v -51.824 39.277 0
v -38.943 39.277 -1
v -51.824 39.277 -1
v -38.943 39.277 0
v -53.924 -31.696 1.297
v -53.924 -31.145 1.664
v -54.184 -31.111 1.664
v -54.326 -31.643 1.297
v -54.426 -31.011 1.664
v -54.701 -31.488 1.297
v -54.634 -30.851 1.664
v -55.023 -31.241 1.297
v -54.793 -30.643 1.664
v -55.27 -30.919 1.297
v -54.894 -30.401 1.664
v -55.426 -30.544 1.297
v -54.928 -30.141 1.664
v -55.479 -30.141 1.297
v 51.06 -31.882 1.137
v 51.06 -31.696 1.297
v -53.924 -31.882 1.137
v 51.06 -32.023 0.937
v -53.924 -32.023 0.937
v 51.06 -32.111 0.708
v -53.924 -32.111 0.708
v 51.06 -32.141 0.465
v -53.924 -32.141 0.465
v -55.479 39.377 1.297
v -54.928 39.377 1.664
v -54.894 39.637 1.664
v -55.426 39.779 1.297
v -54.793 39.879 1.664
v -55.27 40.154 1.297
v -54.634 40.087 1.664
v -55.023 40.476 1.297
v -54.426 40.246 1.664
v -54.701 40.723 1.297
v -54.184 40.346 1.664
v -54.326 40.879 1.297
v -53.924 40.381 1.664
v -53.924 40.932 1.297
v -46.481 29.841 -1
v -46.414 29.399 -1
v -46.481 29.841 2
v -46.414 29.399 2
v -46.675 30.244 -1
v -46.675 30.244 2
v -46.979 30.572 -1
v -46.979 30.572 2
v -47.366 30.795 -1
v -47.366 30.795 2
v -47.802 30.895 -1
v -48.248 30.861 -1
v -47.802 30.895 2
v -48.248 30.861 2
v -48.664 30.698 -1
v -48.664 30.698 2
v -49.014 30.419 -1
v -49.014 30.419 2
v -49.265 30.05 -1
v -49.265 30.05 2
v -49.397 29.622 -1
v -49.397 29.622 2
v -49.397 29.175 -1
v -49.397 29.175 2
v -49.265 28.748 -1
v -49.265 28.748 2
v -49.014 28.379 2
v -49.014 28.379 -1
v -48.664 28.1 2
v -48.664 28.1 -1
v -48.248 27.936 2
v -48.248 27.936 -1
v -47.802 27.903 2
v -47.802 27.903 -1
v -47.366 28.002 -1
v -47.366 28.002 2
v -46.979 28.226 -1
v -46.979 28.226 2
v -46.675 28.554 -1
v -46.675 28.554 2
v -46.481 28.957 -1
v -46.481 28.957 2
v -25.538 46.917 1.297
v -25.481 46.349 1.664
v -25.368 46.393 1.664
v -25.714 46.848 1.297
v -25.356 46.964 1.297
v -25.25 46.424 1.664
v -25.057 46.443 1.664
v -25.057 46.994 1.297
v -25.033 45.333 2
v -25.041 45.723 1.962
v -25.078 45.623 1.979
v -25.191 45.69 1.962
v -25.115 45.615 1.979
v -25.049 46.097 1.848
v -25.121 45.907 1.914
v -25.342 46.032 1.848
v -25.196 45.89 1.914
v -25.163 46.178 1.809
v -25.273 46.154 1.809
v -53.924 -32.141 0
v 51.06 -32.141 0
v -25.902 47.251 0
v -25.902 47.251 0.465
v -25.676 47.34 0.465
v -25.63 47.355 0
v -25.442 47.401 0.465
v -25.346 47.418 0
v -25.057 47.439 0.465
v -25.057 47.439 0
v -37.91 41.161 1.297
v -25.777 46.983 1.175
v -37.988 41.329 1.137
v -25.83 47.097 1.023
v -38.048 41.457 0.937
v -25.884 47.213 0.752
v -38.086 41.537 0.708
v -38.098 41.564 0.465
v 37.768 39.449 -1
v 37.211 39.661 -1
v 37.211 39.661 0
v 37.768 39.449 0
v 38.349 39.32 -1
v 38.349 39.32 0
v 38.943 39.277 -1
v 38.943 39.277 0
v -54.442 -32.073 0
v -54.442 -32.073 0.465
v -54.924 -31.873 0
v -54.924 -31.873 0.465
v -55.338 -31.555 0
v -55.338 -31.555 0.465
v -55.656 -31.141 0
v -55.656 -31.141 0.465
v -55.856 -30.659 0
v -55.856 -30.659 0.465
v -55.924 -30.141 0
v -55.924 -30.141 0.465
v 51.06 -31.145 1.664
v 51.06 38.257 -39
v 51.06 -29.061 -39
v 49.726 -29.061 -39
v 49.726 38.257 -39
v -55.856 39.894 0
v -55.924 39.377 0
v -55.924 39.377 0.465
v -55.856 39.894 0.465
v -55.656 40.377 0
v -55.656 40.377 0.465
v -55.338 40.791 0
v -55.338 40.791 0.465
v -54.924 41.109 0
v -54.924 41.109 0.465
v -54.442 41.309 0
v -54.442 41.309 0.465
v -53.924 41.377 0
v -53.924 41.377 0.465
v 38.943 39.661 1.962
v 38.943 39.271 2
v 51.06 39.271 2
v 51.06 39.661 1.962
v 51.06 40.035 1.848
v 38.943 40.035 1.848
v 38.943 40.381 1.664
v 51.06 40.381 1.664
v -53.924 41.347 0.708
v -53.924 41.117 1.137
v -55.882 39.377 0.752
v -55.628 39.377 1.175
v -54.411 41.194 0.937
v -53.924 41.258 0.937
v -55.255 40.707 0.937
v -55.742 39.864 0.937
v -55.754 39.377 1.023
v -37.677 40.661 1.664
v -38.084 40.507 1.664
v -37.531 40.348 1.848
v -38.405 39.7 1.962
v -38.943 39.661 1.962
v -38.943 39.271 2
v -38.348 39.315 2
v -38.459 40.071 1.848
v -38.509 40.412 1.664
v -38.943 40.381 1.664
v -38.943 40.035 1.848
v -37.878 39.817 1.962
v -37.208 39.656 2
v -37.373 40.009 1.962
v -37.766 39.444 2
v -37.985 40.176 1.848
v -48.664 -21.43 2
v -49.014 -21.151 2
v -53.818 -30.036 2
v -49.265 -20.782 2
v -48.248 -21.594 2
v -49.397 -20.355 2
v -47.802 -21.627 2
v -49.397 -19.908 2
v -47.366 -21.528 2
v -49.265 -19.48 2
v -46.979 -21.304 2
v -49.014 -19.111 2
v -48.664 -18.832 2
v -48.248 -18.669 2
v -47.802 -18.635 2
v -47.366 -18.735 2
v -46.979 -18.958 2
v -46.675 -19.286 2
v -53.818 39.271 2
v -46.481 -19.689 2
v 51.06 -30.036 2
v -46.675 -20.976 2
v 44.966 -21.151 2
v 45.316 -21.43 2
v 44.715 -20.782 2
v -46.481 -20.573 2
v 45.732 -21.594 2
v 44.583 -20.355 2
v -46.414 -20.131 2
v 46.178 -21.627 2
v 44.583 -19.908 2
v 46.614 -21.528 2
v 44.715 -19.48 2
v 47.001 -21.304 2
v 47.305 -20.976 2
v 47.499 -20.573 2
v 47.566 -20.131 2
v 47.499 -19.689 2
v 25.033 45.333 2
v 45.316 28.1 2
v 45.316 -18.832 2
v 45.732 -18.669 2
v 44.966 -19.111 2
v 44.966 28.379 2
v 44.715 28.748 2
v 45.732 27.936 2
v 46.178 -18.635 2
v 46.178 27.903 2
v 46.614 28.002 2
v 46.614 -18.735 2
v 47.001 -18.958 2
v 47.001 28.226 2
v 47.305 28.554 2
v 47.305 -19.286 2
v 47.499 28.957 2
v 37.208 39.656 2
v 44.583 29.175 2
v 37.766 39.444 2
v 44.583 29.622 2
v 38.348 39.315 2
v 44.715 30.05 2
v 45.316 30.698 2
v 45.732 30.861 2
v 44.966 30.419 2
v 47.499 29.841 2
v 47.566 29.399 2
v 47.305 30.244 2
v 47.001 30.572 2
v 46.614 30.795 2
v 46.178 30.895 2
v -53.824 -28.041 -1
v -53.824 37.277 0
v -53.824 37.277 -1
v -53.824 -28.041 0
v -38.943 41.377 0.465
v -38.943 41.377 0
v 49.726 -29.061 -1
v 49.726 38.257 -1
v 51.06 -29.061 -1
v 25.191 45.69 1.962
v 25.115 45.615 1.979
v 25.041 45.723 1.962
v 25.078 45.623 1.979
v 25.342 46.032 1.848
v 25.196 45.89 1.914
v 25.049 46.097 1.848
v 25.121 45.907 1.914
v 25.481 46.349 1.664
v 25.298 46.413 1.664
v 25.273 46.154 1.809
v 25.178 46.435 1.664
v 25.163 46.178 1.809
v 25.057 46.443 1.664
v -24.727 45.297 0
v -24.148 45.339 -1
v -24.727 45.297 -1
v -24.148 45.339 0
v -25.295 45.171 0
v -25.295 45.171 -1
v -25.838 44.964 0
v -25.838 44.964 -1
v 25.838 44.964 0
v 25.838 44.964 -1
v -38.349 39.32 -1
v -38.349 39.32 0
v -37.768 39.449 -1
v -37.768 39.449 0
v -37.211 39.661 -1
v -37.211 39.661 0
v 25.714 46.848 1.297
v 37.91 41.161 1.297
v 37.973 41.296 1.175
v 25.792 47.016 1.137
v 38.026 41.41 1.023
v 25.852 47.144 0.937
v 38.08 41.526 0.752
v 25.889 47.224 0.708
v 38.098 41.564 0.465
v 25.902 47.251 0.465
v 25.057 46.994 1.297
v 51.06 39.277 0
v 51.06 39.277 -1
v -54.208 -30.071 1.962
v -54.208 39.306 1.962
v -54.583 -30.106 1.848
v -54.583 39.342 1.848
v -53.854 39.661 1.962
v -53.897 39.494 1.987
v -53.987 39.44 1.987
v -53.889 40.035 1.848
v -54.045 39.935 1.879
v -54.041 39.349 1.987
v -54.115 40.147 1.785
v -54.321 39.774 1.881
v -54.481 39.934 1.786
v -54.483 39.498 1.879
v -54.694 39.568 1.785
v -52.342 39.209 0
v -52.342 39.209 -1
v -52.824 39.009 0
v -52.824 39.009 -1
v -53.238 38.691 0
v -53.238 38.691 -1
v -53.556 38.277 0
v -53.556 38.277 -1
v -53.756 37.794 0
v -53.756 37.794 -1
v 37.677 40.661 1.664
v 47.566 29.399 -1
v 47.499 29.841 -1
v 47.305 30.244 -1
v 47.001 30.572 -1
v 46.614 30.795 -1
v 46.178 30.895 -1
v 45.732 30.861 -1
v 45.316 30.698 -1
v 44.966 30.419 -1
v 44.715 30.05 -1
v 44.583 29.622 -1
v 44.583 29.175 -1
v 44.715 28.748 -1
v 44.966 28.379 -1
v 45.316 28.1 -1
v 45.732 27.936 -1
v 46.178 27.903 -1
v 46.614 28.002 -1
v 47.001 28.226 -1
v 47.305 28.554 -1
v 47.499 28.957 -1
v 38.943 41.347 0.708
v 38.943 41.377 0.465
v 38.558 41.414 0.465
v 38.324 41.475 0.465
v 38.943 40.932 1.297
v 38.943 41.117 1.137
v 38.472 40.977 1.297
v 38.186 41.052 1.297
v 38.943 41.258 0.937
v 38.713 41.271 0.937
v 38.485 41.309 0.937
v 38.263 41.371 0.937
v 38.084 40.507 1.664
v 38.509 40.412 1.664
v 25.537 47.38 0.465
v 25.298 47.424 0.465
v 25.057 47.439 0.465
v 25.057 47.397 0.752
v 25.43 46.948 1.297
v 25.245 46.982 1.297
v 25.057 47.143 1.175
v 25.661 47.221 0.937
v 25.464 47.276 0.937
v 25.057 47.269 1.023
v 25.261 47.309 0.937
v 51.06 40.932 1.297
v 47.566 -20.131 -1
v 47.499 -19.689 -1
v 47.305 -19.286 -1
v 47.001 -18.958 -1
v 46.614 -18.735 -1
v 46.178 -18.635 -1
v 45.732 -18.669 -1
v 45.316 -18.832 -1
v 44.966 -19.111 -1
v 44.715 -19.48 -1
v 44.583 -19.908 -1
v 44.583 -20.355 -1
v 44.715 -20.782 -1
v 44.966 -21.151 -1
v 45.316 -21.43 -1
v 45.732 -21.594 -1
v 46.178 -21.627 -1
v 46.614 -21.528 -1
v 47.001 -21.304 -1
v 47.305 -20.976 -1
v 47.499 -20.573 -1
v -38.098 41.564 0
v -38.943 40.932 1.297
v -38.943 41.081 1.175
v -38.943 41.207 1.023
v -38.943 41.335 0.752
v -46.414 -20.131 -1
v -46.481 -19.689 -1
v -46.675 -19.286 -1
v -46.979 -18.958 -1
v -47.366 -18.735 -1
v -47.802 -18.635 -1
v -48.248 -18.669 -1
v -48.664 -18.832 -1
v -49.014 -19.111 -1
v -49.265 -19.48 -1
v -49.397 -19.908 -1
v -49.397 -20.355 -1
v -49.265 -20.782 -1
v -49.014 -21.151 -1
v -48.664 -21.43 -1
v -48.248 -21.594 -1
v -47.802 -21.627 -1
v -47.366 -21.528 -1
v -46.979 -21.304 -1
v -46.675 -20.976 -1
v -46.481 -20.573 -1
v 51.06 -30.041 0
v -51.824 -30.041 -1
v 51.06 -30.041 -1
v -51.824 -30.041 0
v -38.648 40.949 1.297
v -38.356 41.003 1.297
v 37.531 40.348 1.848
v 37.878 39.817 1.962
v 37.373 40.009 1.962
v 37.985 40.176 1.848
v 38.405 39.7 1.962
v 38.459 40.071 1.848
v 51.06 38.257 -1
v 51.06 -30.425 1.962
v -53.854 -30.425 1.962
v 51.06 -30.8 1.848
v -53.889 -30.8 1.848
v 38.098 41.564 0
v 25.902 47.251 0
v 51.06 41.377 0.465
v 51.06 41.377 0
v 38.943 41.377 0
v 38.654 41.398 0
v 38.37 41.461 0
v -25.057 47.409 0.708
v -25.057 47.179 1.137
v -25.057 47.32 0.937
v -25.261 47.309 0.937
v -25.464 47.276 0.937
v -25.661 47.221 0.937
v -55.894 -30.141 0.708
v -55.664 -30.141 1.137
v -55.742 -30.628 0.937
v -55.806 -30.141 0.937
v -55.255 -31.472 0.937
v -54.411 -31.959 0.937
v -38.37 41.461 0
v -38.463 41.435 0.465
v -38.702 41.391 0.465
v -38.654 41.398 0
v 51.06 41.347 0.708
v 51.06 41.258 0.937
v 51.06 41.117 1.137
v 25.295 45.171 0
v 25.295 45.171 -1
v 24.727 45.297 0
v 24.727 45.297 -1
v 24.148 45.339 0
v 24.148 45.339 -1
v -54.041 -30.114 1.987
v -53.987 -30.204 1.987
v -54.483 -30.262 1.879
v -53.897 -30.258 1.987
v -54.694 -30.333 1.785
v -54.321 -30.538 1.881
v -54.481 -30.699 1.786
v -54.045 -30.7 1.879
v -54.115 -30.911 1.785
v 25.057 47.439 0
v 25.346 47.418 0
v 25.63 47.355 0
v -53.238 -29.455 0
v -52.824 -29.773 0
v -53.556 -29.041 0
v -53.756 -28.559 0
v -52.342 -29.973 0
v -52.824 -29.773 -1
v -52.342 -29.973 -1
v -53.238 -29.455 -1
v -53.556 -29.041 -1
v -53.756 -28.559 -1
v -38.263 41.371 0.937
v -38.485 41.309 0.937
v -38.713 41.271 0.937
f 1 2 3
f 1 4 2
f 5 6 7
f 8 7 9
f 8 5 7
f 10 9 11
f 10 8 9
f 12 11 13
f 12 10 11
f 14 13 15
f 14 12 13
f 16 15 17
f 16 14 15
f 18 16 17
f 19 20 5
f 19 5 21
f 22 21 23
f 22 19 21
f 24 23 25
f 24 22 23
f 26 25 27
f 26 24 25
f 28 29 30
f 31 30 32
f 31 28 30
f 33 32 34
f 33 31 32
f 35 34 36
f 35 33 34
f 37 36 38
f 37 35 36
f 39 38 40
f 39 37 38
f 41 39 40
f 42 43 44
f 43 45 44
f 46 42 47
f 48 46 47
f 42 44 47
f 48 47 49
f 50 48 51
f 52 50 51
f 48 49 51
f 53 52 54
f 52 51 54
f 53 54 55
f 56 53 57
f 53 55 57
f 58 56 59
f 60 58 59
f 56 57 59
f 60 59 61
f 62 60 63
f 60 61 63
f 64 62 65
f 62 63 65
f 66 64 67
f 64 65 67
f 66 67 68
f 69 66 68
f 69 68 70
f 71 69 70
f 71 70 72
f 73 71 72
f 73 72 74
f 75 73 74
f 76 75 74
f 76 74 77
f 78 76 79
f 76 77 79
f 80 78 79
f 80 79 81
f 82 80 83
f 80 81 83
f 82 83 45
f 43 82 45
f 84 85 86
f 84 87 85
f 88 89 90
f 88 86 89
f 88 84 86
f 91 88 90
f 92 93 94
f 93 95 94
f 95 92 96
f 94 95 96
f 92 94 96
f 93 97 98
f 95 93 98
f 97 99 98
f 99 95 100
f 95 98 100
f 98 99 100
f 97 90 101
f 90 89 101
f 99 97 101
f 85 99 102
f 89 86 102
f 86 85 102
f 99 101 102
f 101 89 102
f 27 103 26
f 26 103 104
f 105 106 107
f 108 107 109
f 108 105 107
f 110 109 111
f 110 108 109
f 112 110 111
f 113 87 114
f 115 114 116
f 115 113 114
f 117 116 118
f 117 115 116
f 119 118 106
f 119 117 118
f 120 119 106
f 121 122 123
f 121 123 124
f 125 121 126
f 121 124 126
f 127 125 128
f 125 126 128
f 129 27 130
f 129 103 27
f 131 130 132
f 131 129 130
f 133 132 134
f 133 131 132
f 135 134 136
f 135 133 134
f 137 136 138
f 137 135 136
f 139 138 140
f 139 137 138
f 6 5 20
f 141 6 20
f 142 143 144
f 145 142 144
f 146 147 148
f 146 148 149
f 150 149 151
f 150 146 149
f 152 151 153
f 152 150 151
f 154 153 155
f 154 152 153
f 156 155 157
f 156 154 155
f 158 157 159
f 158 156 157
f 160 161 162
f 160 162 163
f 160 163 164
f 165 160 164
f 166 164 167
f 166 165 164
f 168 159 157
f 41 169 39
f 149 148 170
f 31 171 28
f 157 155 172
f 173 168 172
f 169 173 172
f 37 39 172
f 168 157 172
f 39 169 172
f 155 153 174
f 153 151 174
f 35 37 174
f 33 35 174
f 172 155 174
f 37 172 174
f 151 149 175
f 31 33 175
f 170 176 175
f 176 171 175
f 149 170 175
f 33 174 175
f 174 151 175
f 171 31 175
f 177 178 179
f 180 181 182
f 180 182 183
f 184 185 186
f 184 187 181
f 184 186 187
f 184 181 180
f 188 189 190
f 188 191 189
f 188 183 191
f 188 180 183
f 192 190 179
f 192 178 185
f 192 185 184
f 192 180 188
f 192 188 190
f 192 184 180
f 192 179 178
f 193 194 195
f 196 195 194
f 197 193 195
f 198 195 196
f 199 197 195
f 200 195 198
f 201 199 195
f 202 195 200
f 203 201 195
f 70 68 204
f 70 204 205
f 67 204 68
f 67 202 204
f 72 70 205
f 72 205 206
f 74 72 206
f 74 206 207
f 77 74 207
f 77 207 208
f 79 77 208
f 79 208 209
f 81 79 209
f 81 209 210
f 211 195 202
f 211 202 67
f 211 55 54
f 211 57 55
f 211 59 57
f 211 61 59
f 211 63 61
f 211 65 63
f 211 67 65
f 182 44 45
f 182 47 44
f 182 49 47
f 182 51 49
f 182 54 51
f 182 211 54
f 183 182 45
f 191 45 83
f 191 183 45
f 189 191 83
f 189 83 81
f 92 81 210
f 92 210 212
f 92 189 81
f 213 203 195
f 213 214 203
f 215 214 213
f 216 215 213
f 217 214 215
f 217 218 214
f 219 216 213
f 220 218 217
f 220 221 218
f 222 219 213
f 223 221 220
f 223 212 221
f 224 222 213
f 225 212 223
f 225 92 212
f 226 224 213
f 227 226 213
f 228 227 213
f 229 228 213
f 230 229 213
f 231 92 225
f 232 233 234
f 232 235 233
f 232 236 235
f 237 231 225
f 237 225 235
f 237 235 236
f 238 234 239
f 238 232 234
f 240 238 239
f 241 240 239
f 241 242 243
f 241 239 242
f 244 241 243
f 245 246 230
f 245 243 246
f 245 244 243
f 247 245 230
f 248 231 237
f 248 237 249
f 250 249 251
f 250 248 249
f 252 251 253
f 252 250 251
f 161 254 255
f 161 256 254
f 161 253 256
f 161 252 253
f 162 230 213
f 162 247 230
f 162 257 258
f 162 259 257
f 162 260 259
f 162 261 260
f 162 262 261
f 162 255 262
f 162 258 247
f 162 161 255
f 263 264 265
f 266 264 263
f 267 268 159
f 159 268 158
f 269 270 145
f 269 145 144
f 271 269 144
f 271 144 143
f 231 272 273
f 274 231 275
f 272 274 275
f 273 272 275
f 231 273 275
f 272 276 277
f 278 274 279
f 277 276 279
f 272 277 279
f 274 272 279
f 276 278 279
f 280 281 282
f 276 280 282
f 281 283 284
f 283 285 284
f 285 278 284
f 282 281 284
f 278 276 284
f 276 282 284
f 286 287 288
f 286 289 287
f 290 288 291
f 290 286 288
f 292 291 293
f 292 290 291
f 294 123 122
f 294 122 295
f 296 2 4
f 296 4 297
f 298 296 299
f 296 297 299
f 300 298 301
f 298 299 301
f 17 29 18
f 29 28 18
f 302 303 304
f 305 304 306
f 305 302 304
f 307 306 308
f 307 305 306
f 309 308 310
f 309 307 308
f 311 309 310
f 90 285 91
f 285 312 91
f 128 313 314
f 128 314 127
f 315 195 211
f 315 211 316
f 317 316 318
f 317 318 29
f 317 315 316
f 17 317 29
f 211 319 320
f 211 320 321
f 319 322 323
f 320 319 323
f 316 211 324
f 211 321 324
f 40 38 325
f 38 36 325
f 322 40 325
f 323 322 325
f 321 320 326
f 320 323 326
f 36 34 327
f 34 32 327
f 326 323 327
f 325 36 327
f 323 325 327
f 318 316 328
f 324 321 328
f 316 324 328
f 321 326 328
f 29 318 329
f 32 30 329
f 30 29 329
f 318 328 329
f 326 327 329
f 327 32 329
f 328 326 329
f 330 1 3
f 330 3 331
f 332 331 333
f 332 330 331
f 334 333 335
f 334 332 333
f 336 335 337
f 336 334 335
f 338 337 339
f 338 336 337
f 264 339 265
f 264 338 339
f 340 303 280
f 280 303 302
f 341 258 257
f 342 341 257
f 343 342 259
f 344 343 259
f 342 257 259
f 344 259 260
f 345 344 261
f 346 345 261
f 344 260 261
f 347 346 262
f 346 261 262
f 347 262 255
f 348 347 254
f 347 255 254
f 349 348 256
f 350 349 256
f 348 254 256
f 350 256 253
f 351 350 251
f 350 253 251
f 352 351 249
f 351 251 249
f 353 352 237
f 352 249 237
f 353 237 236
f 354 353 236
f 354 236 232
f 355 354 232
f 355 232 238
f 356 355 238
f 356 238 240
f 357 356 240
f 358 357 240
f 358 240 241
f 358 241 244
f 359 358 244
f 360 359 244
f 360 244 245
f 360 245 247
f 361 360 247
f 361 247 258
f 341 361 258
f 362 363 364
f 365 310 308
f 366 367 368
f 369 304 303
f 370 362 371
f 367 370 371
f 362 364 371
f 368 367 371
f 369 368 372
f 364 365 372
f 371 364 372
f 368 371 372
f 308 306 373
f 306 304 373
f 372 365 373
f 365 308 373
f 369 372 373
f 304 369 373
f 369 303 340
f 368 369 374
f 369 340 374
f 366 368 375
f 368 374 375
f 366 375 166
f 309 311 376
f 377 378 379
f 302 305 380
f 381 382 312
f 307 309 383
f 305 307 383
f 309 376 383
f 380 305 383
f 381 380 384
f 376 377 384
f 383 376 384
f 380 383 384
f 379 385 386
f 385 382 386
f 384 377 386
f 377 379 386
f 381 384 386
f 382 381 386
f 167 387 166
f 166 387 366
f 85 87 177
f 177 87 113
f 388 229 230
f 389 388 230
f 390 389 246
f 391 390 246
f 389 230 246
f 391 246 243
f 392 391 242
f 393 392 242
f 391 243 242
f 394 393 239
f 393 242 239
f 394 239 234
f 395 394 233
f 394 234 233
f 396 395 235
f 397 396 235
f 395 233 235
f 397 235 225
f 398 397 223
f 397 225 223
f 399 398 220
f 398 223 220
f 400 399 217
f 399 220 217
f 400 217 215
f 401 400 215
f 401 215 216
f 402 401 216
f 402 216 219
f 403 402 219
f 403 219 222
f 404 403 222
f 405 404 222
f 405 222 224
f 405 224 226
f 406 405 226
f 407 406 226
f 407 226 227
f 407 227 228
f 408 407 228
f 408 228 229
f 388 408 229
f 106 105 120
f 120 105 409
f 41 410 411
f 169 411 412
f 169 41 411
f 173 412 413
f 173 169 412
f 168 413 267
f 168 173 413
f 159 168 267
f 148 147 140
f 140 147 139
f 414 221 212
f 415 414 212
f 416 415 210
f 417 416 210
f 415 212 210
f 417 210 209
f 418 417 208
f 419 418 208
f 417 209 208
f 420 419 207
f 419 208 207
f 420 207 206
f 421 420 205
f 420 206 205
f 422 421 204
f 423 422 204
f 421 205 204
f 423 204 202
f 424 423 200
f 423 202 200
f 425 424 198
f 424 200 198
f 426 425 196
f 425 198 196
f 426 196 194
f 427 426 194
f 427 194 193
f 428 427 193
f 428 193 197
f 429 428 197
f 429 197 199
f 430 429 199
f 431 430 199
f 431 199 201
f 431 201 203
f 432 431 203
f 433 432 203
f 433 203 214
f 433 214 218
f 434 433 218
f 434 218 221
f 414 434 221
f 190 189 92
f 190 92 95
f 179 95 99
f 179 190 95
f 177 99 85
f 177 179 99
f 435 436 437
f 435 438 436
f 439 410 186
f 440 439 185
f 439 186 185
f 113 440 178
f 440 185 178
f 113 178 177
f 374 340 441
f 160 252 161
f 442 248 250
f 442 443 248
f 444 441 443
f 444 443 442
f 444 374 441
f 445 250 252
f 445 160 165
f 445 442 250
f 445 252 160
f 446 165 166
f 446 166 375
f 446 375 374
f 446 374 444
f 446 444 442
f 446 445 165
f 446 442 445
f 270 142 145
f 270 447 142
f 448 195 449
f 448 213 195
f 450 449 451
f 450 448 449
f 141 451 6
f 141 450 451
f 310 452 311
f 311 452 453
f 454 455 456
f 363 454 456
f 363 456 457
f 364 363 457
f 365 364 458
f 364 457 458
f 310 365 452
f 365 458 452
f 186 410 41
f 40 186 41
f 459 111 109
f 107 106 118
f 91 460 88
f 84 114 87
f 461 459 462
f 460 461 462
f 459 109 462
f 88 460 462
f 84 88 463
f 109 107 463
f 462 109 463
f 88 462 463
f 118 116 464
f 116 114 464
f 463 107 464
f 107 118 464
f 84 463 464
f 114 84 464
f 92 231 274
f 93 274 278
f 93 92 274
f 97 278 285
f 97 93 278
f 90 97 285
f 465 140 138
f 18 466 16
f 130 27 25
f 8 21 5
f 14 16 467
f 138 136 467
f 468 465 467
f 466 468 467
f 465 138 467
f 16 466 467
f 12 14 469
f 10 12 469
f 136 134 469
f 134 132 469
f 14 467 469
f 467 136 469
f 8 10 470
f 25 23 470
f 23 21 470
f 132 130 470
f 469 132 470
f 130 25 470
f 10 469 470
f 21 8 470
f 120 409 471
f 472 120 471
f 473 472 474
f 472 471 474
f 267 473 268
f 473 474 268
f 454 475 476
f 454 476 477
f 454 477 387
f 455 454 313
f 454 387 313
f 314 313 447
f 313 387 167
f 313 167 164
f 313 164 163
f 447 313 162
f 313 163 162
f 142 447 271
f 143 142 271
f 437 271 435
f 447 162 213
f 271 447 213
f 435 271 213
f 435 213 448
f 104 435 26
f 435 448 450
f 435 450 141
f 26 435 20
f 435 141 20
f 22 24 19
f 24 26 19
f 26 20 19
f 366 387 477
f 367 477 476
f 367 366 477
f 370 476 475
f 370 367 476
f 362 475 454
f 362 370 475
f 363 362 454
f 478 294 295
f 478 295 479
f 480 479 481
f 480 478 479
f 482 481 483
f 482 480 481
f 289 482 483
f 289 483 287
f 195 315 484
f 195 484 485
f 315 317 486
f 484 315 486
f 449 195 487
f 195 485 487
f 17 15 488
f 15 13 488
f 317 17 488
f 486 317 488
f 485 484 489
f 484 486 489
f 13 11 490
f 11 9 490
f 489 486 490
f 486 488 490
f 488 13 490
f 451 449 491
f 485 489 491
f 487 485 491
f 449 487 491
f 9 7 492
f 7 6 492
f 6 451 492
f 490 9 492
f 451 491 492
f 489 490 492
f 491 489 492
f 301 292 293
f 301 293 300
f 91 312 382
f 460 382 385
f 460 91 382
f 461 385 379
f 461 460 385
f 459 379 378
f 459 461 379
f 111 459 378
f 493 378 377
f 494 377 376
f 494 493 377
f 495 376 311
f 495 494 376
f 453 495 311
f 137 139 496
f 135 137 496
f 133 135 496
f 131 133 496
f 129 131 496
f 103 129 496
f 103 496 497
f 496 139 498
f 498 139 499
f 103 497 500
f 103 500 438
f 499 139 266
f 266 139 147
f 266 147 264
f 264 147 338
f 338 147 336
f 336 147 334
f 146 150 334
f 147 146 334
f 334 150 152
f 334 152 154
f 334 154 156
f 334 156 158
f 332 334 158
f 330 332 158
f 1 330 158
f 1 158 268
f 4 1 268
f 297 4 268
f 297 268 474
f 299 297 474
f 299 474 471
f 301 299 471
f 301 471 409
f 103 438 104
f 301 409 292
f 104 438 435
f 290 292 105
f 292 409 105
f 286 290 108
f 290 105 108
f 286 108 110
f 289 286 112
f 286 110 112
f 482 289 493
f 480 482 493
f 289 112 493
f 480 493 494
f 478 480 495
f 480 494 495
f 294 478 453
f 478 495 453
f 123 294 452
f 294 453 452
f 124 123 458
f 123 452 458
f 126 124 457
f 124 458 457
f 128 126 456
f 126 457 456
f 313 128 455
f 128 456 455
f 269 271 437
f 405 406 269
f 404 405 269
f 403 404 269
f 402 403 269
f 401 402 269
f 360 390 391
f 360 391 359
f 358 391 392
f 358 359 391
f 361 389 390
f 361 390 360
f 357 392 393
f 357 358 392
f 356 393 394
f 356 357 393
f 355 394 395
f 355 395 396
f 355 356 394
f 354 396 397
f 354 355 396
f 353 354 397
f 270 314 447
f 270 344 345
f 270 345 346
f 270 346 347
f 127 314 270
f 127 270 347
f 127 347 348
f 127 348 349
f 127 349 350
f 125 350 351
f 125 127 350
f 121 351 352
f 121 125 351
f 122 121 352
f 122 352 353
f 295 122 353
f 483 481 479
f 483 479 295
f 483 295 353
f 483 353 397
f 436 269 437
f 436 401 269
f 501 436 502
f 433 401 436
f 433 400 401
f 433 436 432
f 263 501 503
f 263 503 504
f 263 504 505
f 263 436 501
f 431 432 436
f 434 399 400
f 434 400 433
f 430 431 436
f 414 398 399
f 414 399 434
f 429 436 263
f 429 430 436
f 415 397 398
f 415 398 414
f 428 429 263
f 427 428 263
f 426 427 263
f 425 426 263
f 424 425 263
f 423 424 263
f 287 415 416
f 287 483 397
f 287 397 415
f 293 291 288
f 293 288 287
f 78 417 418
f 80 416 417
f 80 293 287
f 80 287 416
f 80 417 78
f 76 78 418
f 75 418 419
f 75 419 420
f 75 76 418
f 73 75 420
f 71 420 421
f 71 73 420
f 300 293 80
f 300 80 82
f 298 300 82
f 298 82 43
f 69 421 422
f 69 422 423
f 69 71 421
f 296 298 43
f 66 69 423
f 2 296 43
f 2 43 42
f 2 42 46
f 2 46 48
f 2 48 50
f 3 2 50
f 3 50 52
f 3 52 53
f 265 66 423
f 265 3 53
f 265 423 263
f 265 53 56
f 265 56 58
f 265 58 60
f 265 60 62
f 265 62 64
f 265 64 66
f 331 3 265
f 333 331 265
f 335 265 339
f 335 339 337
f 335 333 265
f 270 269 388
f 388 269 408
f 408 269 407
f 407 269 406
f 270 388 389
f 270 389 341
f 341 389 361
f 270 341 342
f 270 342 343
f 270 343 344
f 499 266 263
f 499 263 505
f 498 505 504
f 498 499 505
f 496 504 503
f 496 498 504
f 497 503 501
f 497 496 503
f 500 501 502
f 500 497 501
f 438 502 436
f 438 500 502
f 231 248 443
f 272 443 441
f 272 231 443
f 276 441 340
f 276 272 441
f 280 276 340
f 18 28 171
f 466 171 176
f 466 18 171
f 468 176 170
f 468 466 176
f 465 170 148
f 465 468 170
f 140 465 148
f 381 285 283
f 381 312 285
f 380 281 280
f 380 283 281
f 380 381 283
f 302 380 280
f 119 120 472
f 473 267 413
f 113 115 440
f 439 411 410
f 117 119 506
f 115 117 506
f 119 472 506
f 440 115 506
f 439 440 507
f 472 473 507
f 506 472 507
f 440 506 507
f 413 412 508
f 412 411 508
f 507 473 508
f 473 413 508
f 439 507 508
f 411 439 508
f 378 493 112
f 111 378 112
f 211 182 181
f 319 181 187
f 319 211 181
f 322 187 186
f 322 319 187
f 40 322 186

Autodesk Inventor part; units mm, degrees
ref_plane "YZ Plane" through (0, 0, 0) normal (1, 0, 0) x (0, 1, 0)
ref_plane "XZ Plane" through (0, 0, 0) normal (0, 1, 0) x (-1, 0, 0)
ref_plane "XY Plane" through (0, 0, 0) normal (0, 0, 1) x (1, 0, 0)
sketch "Sketch1" plane through (0, 0, 0) normal (0, 0, 1) x (1, 0, 0)
  line L0 (25.0566, 47.4388) -> (-25.0566, 47.4388)
  line L1 (-25.9018, 47.2514) -> (-38.0982, 41.5642)
  line L2 (-38.9434, 41.3768) -> (-53.924, 41.3768)
  line L3 (-55.924, 39.3768) -> (-55.924, -30.1412)
  line L4 (-53.924, -32.1412) -> (62.994, -32.1412)
  line L5 (64.994, -30.1412) -> (64.994, 39.3768)
  line L6 (62.994, 41.3768) -> (38.9434, 41.3768)
  line L7 (38.0982, 41.5642) -> (25.9018, 47.2514)
  line L8 (0, 0) -> (0, 61.2972) construction
  arc A0 (64.994, 39.3768) -> (62.994, 41.3768) centre (62.994, 39.3768) ccw
  arc A1 (62.994, -32.1412) -> (64.994, -30.1412) centre (62.994, -30.1412) ccw
  arc A2 (-55.924, -30.1412) -> (-53.924, -32.1412) centre (-53.924, -30.1412) ccw
  arc A3 (-53.924, 41.3768) -> (-55.924, 39.3768) centre (-53.924, 39.3768) ccw
  arc A4 (-38.9434, 41.3768) -> (-38.0982, 41.5642) centre (-38.9434, 43.3768) ccw
  arc A5 (-25.0566, 47.4388) -> (-25.9018, 47.2514) centre (-25.0566, 45.4388) ccw
  arc A6 (25.9018, 47.2514) -> (25.0566, 47.4388) centre (25.0566, 45.4388) ccw
  arc A7 (38.0982, 41.5642) -> (38.9434, 41.3768) centre (38.9434, 43.3768) ccw
  point P0 (25.5, 47.4388)
  point P1 (-25.5, 47.4388)
  point P2 (-38.5, 41.3768)
  point P3 (-55.924, 41.3768)
  point P4 (-55.924, -32.1412)
  point P5 (64.994, 41.3768)
  point P6 (38.5, 41.3768)
  point P7 (0, 47.4388)
  dimension "d48" = 51
  dimension "d50" = 155
  dimension "d51" = 155
  dimension "d52" = 13
  dimension "d53" = 17.424
  dimension "d54" = 26.494
  dimension "d55" = 73.518
  dimension "d56" = 13
  dimension "d57" = 2
extrude "Extrusion1" add sketch "Sketch1" along normal blind 2
chamfer "Chamfer1" distance 1.5 distance2 1 16 edges at (50.9687, 41.3768, 2) (38.5105, 41.4242, 2) (32, 44.4078, 2) (25.4895, 47.3914, 2) (0, 47.4388, 2) (-25.4895, 47.3914, 2) (-32, 44.4078, 2) (-38.5105, 41.4242, 2) (-46.4337, 41.3768, 2) (-55.3382, 40.791, 2) (-55.924, 4.6178, 2) (-55.3382, -31.5554, 2) (4.535, -32.1412, 2) (64.4082, -31.5554, 2) (64.994, 4.6178, 2) (64.4082, 40.791, 2) measured on face at (11.3755, -5.6145, 2)
fillet "Fillet1" radius 2 16 edges at (-54.2776, 39.7304, 2) (-46.4337, 39.8768, 2) (-38.1859, 39.9598, 2) (-31.3661, 43.0484, 2) (-25.1648, 45.927, 2) (0, 45.9388, 2) (25.1648, 45.927, 2) (31.3661, 43.0484, 2) (38.1859, 39.9598, 2) (50.9687, 39.8768, 2) (63.3476, 39.7304, 2) (63.494, 4.6178, 2) (63.3476, -30.4947, 2) (4.535, -30.6412, 2) (-54.2776, -30.4947, 2) (-54.424, 4.6178, 2)
fillet "Fillet2" radius 1 16 edges at (-55.3382, -31.5554, 1) (4.535, -32.1412, 1) (64.4082, -31.5554, 1) (64.994, 4.6178, 1) (64.4082, 40.791, 1) (50.9687, 41.3768, 1) (38.5105, 41.4242, 1) (32, 44.4078, 1) (25.4895, 47.3914, 1) (0, 47.4388, 1) (-25.4895, 47.3914, 1) (-32, 44.4078, 1) (-38.5105, 41.4242, 1) (-46.4337, 41.3768, 1) (-55.3382, 40.791, 1) (-55.924, 4.6178, 1)
feature "Lip1" [suppressed]
sketch "Sketch8" plane through (0, 0, 0) normal (0, 0, -1) x (-1, 0, 0)
  line L0 (-64.994, 39.3768) -> (-64.994, -30.1412) projected
  arc A0 (-64.994, -30.1412) -> (-62.994, -32.1412) centre (-62.994, -30.1412) ccw projected
  line L1 (-62.994, -32.1412) -> (53.924, -32.1412) projected
  arc A1 (53.924, -32.1412) -> (55.924, -30.1412) centre (53.924, -30.1412) ccw projected
  line L2 (55.924, -30.1412) -> (55.924, 39.3768) projected
  arc A2 (55.924, 39.3768) -> (53.924, 41.3768) centre (53.924, 39.3768) ccw projected
  line L3 (53.924, 41.3768) -> (38.9434, 41.3768) projected
  arc A3 (38.0982, 41.5642) -> (38.9434, 41.3768) centre (38.9434, 43.3768) ccw projected
  line L4 (38.0982, 41.5642) -> (25.9018, 47.2514) projected
  arc A4 (25.9018, 47.2514) -> (25.0566, 47.4388) centre (25.0566, 45.4388) ccw projected
  line L5 (25.0566, 47.4388) -> (-25.0566, 47.4388) projected
  arc A5 (-25.0566, 47.4388) -> (-25.9018, 47.2514) centre (-25.0566, 45.4388) ccw projected
  line L6 (-25.9018, 47.2514) -> (-38.0982, 41.5642) projected
  arc A6 (-38.9434, 41.3768) -> (-38.0982, 41.5642) centre (-38.9434, 43.3768) ccw projected
  line L7 (-38.9434, 41.3768) -> (-62.994, 41.3768) projected
  arc A7 (-62.994, 41.3768) -> (-64.994, 39.3768) centre (-62.994, 39.3768) ccw projected
  line L8 (-60.894, 39.2768) -> (-38.9434, 39.2768)
  arc A8 (-38.9434, 39.2768) -> (-37.2107, 39.661) centre (-38.9434, 43.3768) ccw
  line L9 (-37.2107, 39.661) -> (-25.8381, 44.964)
  line L10 (-24.1477, 45.3388) -> (24.1477, 45.3388)
  line L11 (25.8381, 44.964) -> (37.2107, 39.661)
  arc A9 (37.2107, 39.661) -> (38.9434, 39.2768) centre (38.9434, 43.3768) ccw
  line L12 (38.9434, 39.2768) -> (51.824, 39.2768)
  line L13 (53.824, 37.2768) -> (53.824, -28.0412)
  line L14 (51.824, -30.0412) -> (-60.894, -30.0412)
  line L15 (-62.894, -28.0412) -> (-62.894, 37.2768)
  arc A10 (-60.894, 39.2768) -> (-62.894, 37.2768) centre (-60.894, 37.2768) ccw
  arc A11 (-62.894, -28.0412) -> (-60.894, -30.0412) centre (-60.894, -28.0412) ccw
  arc A12 (51.824, -30.0412) -> (53.824, -28.0412) centre (51.824, -28.0412) ccw
  arc A13 (53.824, 37.2768) -> (51.824, 39.2768) centre (51.824, 37.2768) ccw
  arc A14 (-24.1477, 45.3388) -> (-25.8381, 44.964) centre (-24.1477, 41.3388) ccw
  arc A15 (25.8381, 44.964) -> (24.1477, 45.3388) centre (24.1477, 41.3388) ccw
  point P0 (0, 0)
  dimension "d62" = 2.1
  dimension "d63" = 2
  dimension "d64" = 4
extrude "Extrusion7" add sketch "Sketch8" along normal blind 1 contours L8 A8 L9 A14 L10 A15 L11 A9 L12 A13 L13 A12 L14 A11 L15 A10
sketch "Sketch4" plane through (0, 0, 2) normal (0, 0, 1) x (1, 0, 0)
  line L0 (92.6097, 61.0907) -> (51.0597, 61.0907)
  line L1 (51.0597, 61.0907) -> (51.0597, -62.6292)
  line L2 (51.0597, -62.6292) -> (92.6097, -62.6292)
  line L3 (92.6097, -62.6292) -> (92.6097, 61.0907)
  line L4 (64.5487, 39.3768) -> (64.5487, -30.1412) projected
  point P0 (0, 0)
  dimension "d21" = 123.7199
  dimension "d22" = 41.55
  dimension "d58" = 13.489
extrude "Extrusion3" cut sketch "Sketch4" against normal blind 10
sketch "Sketch7" plane through (0, 0, 0) normal (0, 0, -1) x (-1, 0, 0)
  line L0 (-51.0597, 38.2572) -> (-49.7257, 38.2572)
  line L1 (-49.7257, 38.2572) -> (-49.7257, -29.0608)
  line L2 (-49.7257, -29.0608) -> (-51.0597, -29.0608)
  line L3 (-51.0597, -29.0608) -> (-51.0597, 38.2572)
  line L4 (-51.0597, -30.0412) -> (-51.0597, -32.1412) projected
  line L5 (53.924, -30.8108) -> (-51.0597, -30.8108) projected
  line L6 (-51.0597, 42.7072) -> (-38.8527, 42.7072) projected
  point P0 (0, 0)
  point P1 (-51.0597, -28.8108)
  point P2 (-51.0597, 40.7072)
  point P3 (-32.4217, 42.6092)
  dimension "d35" = 1.334
  dimension "d59" = 1.75
  dimension "d60" = 4.45
  dimension "d61" = 67.318
extrude "Extrusion6" add sketch "Sketch7" along normal blind 39
sketch "Sketch9" plane through (0, 0, 2) normal (0, 0, 1) x (1, 0, 0)
  circle A0 centre (-47.914, 29.3988) radius 1.5 projected
  circle A1 centre (-47.914, -20.1312) radius 1.5 projected
  circle A2 centre (46.066, 29.3988) radius 1.5 projected
  circle A3 centre (46.066, -20.1312) radius 1.5 projected
  point P0 (0, 0)
extrude "Extrusion8" cut sketch "Sketch9" against normal blind 10
properties part number "Simple3DPrintBackplate01" material "Aluminum 6061 Black Anodized"
